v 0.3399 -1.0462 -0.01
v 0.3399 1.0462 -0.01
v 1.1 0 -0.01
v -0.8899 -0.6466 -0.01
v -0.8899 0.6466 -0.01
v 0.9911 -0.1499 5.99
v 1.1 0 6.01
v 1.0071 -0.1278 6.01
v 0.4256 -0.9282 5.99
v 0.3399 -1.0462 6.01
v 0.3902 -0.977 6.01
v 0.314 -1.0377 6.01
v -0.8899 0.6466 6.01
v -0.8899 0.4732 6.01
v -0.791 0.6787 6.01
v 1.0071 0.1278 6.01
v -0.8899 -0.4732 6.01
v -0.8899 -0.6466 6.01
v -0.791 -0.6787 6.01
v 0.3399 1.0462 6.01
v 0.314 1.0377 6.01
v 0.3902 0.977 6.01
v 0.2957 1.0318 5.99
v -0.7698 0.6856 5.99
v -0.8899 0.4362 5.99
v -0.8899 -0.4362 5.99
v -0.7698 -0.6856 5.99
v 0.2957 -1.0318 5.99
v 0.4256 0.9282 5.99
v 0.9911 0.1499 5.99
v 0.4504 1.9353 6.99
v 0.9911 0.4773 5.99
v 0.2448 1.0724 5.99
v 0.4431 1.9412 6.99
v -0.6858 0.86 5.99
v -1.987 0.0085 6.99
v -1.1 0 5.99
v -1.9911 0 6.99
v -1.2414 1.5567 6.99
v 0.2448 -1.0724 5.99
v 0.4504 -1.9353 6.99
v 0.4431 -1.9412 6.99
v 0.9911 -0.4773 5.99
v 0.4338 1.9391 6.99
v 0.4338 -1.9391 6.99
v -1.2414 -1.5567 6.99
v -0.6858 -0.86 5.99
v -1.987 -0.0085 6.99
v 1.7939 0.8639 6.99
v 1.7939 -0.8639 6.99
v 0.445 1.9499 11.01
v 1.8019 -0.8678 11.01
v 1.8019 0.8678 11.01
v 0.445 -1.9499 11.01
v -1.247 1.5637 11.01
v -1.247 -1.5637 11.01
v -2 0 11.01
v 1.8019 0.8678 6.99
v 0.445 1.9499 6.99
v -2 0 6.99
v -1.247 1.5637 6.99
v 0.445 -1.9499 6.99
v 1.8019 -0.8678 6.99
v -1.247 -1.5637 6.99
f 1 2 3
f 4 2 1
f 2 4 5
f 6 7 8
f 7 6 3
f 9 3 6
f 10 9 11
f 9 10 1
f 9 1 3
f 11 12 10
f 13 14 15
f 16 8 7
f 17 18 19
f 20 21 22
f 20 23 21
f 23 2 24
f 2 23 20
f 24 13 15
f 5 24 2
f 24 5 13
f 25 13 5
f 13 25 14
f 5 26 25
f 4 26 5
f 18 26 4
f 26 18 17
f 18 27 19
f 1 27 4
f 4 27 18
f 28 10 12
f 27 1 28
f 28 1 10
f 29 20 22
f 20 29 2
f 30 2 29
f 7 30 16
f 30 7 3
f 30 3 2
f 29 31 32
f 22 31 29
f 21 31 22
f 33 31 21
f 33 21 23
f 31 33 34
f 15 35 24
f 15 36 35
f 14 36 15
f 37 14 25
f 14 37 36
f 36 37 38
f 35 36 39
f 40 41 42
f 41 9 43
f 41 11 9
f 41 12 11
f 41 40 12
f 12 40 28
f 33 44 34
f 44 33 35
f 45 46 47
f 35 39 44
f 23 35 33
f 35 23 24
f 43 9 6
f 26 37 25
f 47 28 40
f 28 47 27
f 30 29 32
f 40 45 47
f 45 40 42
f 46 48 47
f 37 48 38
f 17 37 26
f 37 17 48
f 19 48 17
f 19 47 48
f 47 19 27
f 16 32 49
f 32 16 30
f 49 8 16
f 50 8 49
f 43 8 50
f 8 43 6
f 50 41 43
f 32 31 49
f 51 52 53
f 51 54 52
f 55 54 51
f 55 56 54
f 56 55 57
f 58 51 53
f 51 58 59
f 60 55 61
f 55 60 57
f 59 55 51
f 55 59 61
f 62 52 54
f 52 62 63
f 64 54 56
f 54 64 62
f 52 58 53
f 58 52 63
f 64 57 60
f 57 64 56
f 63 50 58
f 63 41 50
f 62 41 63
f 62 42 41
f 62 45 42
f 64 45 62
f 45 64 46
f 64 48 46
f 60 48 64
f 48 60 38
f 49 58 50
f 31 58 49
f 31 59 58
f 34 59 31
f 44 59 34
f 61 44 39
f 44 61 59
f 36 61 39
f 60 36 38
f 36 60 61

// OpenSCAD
/*
    OpenPaddle

    Copyright (C) 2023  Matthias Jordan

    This program is free software: you can redistribute it and/or modify
    it under the terms of the GNU General Public License as published by
    the Free Software Foundation, either version 3 of the License, or
    (at your option) any later version.

    This program is distributed in the hope that it will be useful,
    but WITHOUT ANY WARRANTY; without even the implied warranty of
    MERCHANTABILITY or FITNESS FOR A PARTICULAR PURPOSE.  See the
    GNU General Public License for more details.

    You should have received a copy of the GNU General Public License
    along with this program.  If not, see <https://www.gnu.org/licenses/>.
*/    

//////////////////////////////////////////////////////////////////////
//
//
// A helper for cut-outs of screws.
//
//
//////////////////////////////////////////////////////////////////////


screwhole();

module screwhole(screwdiam=2.2, headdiam=4, headconeheight=1, headheight=4, shankheight=6) {

    // Shank
    translate([0, 0, -0.01]) linear_extrude(height=shankheight+0.02) circle(screwdiam/2);

    // Head
    translate([0, 0, shankheight+headconeheight]) rotate([0, 180, 0]) cylinder(h=headconeheight+0.01, r1=headdiam/2, r2=screwdiam/2, center=false);

    // Hole above head
    translate([0, 0, shankheight+headconeheight+headheight+0.01]) rotate([0, 180, 0]) cylinder(h=headheight+0.02, r=headdiam/2, center=false);

}
